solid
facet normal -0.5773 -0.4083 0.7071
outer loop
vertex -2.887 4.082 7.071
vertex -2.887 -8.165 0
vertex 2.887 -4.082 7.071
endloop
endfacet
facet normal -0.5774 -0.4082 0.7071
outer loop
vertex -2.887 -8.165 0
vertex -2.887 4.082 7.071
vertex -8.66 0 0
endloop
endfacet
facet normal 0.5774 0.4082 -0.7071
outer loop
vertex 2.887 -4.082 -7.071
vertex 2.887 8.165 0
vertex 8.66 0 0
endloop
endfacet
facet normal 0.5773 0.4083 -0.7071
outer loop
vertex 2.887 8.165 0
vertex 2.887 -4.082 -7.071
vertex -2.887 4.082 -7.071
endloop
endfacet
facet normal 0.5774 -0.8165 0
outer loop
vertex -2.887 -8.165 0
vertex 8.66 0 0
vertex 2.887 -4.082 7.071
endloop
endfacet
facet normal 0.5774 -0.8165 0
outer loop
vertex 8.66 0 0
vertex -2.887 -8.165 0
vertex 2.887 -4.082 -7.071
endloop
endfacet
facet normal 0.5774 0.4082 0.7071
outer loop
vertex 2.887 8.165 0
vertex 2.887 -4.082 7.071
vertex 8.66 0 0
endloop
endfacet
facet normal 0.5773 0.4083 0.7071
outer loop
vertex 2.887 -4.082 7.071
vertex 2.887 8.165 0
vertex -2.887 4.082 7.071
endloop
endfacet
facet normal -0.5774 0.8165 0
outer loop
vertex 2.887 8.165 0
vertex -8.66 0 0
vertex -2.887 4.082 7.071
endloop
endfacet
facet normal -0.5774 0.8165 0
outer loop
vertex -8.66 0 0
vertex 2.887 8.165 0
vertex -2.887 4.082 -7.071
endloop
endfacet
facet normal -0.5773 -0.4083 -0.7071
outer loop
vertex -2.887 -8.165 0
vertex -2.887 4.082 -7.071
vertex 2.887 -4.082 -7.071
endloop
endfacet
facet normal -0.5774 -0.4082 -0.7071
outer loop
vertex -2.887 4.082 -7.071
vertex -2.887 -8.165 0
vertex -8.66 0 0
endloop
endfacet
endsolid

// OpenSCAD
// OpenSCAD 为免费开源的跨平台建模软件
// 作者：上海市第三女子初级中学 谢丁

a = 10; // 立方体的边长
e = 0.0; // 咬合面距离调整，数值越小，咬合精度越高
length = norm([a, a, a]); // 欧氏距离
b = acos(a / length); // 倾斜角
c = atan2(a, a);    // 方位角

rotate([0, -c, 90 - b]) cube([a, a, a], center = true); // 原始立方体
